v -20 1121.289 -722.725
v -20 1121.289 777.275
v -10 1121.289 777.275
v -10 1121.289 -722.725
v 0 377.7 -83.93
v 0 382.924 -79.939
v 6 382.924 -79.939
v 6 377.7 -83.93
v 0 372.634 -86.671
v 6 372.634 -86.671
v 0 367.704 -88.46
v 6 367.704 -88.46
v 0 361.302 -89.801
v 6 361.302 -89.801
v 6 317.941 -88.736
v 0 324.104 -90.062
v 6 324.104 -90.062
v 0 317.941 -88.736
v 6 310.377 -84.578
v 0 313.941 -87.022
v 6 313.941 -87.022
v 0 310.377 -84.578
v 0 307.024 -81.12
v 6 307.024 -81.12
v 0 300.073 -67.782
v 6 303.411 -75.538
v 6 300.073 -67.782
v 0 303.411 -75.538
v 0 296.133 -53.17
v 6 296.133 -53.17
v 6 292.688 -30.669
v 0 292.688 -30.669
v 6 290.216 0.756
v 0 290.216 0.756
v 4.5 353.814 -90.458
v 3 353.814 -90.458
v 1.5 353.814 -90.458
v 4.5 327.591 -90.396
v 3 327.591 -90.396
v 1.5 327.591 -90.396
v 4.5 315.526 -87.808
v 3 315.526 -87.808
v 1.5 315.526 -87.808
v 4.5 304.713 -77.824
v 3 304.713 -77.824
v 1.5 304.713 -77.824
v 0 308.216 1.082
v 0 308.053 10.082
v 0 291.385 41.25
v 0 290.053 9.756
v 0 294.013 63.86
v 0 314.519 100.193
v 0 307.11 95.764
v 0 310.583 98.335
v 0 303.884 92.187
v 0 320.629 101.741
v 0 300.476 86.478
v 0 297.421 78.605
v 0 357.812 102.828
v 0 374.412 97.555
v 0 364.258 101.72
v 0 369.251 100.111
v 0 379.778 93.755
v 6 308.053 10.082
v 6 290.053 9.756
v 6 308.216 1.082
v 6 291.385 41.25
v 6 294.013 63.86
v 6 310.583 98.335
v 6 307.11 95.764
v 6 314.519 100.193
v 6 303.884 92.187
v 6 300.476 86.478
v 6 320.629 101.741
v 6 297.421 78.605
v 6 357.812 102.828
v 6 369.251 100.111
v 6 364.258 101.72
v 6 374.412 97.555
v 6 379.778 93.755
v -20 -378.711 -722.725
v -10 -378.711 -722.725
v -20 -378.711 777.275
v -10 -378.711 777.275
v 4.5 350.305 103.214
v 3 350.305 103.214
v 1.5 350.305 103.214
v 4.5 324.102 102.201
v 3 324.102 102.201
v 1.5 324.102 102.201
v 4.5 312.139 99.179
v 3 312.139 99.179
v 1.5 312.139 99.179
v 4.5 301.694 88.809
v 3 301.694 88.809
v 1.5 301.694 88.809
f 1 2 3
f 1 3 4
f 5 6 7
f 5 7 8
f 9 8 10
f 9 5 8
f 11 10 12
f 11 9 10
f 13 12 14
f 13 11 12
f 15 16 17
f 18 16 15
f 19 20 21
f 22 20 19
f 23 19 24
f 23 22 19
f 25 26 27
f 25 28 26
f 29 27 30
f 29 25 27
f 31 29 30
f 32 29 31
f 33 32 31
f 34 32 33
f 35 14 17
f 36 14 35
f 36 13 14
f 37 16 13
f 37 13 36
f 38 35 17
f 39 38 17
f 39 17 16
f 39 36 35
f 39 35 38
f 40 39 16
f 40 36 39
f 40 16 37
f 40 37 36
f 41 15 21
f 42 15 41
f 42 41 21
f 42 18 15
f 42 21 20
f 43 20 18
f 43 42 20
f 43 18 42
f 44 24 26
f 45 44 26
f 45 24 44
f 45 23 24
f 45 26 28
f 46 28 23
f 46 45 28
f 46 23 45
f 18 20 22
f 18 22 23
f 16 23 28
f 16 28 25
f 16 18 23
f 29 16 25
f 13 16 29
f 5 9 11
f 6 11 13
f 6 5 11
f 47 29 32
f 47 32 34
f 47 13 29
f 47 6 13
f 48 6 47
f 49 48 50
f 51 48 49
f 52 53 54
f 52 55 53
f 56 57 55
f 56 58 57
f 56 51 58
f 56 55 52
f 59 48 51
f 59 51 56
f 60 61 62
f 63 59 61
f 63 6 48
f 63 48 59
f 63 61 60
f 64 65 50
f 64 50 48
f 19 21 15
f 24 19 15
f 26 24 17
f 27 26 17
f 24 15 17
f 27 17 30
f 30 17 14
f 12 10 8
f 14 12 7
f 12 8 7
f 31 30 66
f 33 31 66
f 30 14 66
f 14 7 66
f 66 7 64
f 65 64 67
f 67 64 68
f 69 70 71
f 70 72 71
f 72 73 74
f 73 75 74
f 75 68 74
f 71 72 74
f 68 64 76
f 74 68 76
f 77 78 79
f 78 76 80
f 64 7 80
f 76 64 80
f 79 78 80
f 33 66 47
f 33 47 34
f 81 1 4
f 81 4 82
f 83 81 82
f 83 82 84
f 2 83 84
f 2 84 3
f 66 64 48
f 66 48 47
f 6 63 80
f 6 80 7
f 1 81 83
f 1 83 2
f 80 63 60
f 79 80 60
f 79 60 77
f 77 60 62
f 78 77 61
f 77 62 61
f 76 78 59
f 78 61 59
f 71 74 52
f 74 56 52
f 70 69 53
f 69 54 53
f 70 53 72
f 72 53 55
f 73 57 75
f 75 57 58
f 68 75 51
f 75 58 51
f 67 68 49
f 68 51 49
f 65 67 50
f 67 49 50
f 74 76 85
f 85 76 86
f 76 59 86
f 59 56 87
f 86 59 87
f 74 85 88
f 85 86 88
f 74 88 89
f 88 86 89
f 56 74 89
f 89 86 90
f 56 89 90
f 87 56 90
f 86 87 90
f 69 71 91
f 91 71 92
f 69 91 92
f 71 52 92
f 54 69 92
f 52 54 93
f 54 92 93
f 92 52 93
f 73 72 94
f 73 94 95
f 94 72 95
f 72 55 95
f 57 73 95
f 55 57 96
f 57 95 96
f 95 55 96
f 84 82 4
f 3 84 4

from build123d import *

# Parameters (mm, degrees)
BOSS_EXTRU_2_DEPTH      = 10
BOSS_EXTRU_3_DEPTH      = 6
ENL_V_MAT_EXTRU_1_DEPTH = 10


with BuildPart() as part:
    # Esquisse3D1 → Boss.-Extru.2 (new body)
    with BuildSketch(Plane(origin=(-20, 1121.289346724, 777.274991403), x_dir=(0, -0.7071067811865476, -0.7071067811865476), z_dir=(1, 0, 0))):
        Polygon((0, 0), (1060.66017178, 1060.66017178), (2121.32034356, 0), (1060.66017178, -1060.66017178), align=None)
    extrude(amount=BOSS_EXTRU_2_DEPTH)


with BuildPart() as body_2:
    # Esquisse5 → Boss.-Extru.3 (new body)
    with BuildSketch(Plane(origin=(0, 0, 0), x_dir=(0, 0, -1), z_dir=(1, 0, 0))):
        with BuildLine():
            Line((-93.755345908, 379.77774717), (79.938710943, 382.924280537))
            add(Edge.make_bspline(
                [(79.938710943, 382.924280537), (108.216840261, 351.133713236), (60.764258189, 328.313918745), (143.438885638, 296.978083527), (-5.253315798, 289.992072674)],
                knots=[0, 0, 0, 0, 0, 1, 1, 1, 1, 1], degree=4))
            add(Edge.make_bspline(
                [(-93.755345908, 379.77774717), (-120.863503042, 346.983836395), (-72.615548345, 325.897693232), (-154.100982944, 291.588036559), (-5.253315798, 289.992072674)],
                knots=[0, 0, 0, 0, 0, 1, 1, 1, 1, 1], degree=4))
        make_face()
    extrude(amount=BOSS_EXTRU_3_DEPTH)

    # Esquisse6 → Enlèv. mat.-Extru.1 (cut)
    with BuildSketch(Plane(origin=(6, 0, 0), x_dir=(0, 0, -1), z_dir=(1, 0, 0))):
        Polygon((-9.755892135, 290.052771706), (-10.081968925, 308.052771706), (-1.081968925, 308.215810101), (-0.755892135, 290.215810101), (9.798309297, 280.709423004), (-13.542023743, 279.203595066), align=None)
    extrude(amount=-ENL_V_MAT_EXTRU_1_DEPTH, mode=Mode.SUBTRACT)


solid = Compound([part.part, body_2.part])
